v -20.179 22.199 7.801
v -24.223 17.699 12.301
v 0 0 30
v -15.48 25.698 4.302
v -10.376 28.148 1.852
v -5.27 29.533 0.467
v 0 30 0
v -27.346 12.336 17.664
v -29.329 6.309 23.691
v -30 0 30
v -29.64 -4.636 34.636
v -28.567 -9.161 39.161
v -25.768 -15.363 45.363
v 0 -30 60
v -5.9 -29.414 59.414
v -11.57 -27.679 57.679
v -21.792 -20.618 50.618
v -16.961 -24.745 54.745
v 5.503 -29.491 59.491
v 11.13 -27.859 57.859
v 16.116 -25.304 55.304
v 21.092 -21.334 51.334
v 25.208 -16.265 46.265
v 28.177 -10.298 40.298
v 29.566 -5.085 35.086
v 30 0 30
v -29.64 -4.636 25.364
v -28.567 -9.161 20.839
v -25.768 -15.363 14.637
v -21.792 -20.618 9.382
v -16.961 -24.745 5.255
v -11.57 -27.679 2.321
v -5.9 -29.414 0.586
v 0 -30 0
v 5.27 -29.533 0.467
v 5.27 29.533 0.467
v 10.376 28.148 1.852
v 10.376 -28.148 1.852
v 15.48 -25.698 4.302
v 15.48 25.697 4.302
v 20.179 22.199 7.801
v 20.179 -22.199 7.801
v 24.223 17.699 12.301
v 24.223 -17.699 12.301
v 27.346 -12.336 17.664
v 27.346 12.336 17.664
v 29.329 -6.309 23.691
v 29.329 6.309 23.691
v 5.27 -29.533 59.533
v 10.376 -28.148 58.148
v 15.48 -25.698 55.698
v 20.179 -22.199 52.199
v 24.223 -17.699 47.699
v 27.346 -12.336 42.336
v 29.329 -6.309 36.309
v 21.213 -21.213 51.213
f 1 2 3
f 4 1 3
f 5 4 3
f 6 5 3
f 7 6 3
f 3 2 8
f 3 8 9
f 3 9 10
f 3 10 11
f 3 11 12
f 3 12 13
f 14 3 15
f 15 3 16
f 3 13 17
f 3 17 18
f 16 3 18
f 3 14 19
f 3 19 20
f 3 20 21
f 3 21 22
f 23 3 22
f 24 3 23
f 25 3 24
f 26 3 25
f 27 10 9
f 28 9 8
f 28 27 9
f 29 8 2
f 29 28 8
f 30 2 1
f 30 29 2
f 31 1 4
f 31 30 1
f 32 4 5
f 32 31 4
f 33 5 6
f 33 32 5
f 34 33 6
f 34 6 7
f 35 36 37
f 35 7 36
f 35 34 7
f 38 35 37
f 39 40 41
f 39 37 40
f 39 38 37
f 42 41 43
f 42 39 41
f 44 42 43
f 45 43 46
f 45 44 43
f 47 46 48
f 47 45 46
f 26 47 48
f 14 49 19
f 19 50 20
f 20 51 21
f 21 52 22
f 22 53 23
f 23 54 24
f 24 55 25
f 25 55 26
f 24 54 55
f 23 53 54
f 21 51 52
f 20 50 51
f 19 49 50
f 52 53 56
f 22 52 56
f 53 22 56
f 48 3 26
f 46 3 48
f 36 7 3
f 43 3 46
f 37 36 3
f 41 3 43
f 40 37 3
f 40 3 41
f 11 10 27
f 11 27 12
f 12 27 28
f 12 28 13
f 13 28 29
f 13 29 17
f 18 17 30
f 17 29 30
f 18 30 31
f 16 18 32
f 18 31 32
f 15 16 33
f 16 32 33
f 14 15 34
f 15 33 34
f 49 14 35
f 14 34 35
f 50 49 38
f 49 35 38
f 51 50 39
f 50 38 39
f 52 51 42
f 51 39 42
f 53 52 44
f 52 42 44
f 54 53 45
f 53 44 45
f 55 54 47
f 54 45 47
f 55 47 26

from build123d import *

# Parameters (mm, degrees)
SKETCH1_R               = 29.999999999999996
BOSS_EXTRUDE1_DEPTH     = 60
CUT_EXTRUDE2_DEPTH      = 60
CUT_EXTRUDE2_DEPTH_BACK = 60
CUT_EXTRUDE6_DEPTH      = 60
CUT_EXTRUDE6_DEPTH_BACK = 60
CUT_EXTRUDE7_DEPTH      = 0.0001
BOSS_EXTRUDE2_DEPTH     = 0.0001


with BuildPart() as part:
    # Sketch1 → Boss-Extrude1 (new body)
    with BuildSketch(Plane.XY):
        Circle(SKETCH1_R)
    extrude(amount=BOSS_EXTRUDE1_DEPTH)

    # Sketch2 → Cut-Extrude2 (cut, two sides: drawn at the far end of the back side and taken through both)
    with BuildSketch(Plane(origin=(0, 0, 0), x_dir=(1, 0, 0), z_dir=(0, 1, 0)).offset(-CUT_EXTRUDE2_DEPTH_BACK)):
        with BuildLine():
            Line((-7.1054e-13, 0), (-30, 0))
            Line((-30, 0), (-30, -30.00000000000002))
            ThreePointArc((-30, -29.999999999999996), (-21.213203435596675, -8.786796564403826), (-7.1093e-13, 0))
        make_face()
        with BuildLine():
            Line((30, 0), (-7.1054e-13, 0))
            ThreePointArc((-7.1093e-13, 0), (21.213203435596174, -8.786796564403325), (30, -30))
            Line((30, -30), (30, 0))
        make_face()
        with BuildLine():
            ThreePointArc((2.2327e-12, -60), (-21.213203435595638, -51.21320343559721), (-30, -29.999999999999996))
            Line((-30, -30.00000000000002), (-30, -60))
            Line((-30, -60), (2.2311e-12, -60))
        make_face()
        with BuildLine():
            Line((30, -60), (30, -30))
            ThreePointArc((30, -30.000000000000007), (21.21320343559721, -51.21320343559564), (2.2327e-12, -60))
            Line((2.2311e-12, -60), (30, -60))
        make_face()
    extrude(amount=CUT_EXTRUDE2_DEPTH + CUT_EXTRUDE2_DEPTH_BACK, mode=Mode.SUBTRACT)

    # Sketch7 → Cut-Extrude6 (cut, two sides: drawn at the far end of the back side and taken through both)
    with BuildSketch(Plane(origin=(0, 0, 0), x_dir=(0, 0, -1), z_dir=(1, 0, 0)).offset(-CUT_EXTRUDE6_DEPTH_BACK)):
        Polygon((0, 30), (-60, -30), (-60, 30), align=None)
    extrude(amount=CUT_EXTRUDE6_DEPTH + CUT_EXTRUDE6_DEPTH_BACK, mode=Mode.SUBTRACT)

    # Sketch8 → Cut-Extrude7 (cut)
    with BuildSketch(Plane(origin=(0, 15.000000000000005, 15.000000000000004), x_dir=(1, 0, 0), z_dir=(0, 0.7071067811865477, 0.7071067811865475))):
        with BuildLine():
            Line((2.22e-15, 21.21320343559642), (1.0474e-13, -21.213203435596412))
            Line((1.0474e-13, -21.213203435596412), (29.999999999999996, -21.213203435596427))
            add(Edge.make_bspline(
                [(30, -21.21320343559644), (30.000000000000018, 21.213203435596398), (1.677e-14, 21.21320343559642)],
                knots=[4.71238898038469, 4.71238898038469, 4.71238898038469, 6.283185307179586, 6.283185307179586, 6.283185307179586], degree=2, weights=[1, 0.7071067811865476, 1]))
        make_face()
    extrude(amount=-CUT_EXTRUDE7_DEPTH, mode=Mode.SUBTRACT)

    # Sketch9 → Boss-Extrude2 (add)
    with BuildSketch(Plane(origin=(0, 15.000000000000005, 15.000000000000004), x_dir=(1, 0, 0), z_dir=(0, 0.7071067811865477, 0.7071067811865475))):
        with BuildLine():
            Line((29.99999999995833, -21.213203435596427), (1.0408e-13, -21.213203435596416))
            Line((1.0408e-13, -21.213203435596416), (1.9602e-13, -63.639610306789265))
            add(Edge.make_bspline(
                [(-1.309e-14, -63.63961030678927), (29.999999999999982, -63.63961030678929), (30, -21.21320343559644)],
                knots=[3.141592653589793, 3.141592653589793, 3.141592653589793, 4.71238898038469, 4.71238898038469, 4.71238898038469], degree=2, weights=[1, 0.7071067811865476, 1]))
        make_face()
    extrude(amount=BOSS_EXTRUDE2_DEPTH)


solid = part.part
